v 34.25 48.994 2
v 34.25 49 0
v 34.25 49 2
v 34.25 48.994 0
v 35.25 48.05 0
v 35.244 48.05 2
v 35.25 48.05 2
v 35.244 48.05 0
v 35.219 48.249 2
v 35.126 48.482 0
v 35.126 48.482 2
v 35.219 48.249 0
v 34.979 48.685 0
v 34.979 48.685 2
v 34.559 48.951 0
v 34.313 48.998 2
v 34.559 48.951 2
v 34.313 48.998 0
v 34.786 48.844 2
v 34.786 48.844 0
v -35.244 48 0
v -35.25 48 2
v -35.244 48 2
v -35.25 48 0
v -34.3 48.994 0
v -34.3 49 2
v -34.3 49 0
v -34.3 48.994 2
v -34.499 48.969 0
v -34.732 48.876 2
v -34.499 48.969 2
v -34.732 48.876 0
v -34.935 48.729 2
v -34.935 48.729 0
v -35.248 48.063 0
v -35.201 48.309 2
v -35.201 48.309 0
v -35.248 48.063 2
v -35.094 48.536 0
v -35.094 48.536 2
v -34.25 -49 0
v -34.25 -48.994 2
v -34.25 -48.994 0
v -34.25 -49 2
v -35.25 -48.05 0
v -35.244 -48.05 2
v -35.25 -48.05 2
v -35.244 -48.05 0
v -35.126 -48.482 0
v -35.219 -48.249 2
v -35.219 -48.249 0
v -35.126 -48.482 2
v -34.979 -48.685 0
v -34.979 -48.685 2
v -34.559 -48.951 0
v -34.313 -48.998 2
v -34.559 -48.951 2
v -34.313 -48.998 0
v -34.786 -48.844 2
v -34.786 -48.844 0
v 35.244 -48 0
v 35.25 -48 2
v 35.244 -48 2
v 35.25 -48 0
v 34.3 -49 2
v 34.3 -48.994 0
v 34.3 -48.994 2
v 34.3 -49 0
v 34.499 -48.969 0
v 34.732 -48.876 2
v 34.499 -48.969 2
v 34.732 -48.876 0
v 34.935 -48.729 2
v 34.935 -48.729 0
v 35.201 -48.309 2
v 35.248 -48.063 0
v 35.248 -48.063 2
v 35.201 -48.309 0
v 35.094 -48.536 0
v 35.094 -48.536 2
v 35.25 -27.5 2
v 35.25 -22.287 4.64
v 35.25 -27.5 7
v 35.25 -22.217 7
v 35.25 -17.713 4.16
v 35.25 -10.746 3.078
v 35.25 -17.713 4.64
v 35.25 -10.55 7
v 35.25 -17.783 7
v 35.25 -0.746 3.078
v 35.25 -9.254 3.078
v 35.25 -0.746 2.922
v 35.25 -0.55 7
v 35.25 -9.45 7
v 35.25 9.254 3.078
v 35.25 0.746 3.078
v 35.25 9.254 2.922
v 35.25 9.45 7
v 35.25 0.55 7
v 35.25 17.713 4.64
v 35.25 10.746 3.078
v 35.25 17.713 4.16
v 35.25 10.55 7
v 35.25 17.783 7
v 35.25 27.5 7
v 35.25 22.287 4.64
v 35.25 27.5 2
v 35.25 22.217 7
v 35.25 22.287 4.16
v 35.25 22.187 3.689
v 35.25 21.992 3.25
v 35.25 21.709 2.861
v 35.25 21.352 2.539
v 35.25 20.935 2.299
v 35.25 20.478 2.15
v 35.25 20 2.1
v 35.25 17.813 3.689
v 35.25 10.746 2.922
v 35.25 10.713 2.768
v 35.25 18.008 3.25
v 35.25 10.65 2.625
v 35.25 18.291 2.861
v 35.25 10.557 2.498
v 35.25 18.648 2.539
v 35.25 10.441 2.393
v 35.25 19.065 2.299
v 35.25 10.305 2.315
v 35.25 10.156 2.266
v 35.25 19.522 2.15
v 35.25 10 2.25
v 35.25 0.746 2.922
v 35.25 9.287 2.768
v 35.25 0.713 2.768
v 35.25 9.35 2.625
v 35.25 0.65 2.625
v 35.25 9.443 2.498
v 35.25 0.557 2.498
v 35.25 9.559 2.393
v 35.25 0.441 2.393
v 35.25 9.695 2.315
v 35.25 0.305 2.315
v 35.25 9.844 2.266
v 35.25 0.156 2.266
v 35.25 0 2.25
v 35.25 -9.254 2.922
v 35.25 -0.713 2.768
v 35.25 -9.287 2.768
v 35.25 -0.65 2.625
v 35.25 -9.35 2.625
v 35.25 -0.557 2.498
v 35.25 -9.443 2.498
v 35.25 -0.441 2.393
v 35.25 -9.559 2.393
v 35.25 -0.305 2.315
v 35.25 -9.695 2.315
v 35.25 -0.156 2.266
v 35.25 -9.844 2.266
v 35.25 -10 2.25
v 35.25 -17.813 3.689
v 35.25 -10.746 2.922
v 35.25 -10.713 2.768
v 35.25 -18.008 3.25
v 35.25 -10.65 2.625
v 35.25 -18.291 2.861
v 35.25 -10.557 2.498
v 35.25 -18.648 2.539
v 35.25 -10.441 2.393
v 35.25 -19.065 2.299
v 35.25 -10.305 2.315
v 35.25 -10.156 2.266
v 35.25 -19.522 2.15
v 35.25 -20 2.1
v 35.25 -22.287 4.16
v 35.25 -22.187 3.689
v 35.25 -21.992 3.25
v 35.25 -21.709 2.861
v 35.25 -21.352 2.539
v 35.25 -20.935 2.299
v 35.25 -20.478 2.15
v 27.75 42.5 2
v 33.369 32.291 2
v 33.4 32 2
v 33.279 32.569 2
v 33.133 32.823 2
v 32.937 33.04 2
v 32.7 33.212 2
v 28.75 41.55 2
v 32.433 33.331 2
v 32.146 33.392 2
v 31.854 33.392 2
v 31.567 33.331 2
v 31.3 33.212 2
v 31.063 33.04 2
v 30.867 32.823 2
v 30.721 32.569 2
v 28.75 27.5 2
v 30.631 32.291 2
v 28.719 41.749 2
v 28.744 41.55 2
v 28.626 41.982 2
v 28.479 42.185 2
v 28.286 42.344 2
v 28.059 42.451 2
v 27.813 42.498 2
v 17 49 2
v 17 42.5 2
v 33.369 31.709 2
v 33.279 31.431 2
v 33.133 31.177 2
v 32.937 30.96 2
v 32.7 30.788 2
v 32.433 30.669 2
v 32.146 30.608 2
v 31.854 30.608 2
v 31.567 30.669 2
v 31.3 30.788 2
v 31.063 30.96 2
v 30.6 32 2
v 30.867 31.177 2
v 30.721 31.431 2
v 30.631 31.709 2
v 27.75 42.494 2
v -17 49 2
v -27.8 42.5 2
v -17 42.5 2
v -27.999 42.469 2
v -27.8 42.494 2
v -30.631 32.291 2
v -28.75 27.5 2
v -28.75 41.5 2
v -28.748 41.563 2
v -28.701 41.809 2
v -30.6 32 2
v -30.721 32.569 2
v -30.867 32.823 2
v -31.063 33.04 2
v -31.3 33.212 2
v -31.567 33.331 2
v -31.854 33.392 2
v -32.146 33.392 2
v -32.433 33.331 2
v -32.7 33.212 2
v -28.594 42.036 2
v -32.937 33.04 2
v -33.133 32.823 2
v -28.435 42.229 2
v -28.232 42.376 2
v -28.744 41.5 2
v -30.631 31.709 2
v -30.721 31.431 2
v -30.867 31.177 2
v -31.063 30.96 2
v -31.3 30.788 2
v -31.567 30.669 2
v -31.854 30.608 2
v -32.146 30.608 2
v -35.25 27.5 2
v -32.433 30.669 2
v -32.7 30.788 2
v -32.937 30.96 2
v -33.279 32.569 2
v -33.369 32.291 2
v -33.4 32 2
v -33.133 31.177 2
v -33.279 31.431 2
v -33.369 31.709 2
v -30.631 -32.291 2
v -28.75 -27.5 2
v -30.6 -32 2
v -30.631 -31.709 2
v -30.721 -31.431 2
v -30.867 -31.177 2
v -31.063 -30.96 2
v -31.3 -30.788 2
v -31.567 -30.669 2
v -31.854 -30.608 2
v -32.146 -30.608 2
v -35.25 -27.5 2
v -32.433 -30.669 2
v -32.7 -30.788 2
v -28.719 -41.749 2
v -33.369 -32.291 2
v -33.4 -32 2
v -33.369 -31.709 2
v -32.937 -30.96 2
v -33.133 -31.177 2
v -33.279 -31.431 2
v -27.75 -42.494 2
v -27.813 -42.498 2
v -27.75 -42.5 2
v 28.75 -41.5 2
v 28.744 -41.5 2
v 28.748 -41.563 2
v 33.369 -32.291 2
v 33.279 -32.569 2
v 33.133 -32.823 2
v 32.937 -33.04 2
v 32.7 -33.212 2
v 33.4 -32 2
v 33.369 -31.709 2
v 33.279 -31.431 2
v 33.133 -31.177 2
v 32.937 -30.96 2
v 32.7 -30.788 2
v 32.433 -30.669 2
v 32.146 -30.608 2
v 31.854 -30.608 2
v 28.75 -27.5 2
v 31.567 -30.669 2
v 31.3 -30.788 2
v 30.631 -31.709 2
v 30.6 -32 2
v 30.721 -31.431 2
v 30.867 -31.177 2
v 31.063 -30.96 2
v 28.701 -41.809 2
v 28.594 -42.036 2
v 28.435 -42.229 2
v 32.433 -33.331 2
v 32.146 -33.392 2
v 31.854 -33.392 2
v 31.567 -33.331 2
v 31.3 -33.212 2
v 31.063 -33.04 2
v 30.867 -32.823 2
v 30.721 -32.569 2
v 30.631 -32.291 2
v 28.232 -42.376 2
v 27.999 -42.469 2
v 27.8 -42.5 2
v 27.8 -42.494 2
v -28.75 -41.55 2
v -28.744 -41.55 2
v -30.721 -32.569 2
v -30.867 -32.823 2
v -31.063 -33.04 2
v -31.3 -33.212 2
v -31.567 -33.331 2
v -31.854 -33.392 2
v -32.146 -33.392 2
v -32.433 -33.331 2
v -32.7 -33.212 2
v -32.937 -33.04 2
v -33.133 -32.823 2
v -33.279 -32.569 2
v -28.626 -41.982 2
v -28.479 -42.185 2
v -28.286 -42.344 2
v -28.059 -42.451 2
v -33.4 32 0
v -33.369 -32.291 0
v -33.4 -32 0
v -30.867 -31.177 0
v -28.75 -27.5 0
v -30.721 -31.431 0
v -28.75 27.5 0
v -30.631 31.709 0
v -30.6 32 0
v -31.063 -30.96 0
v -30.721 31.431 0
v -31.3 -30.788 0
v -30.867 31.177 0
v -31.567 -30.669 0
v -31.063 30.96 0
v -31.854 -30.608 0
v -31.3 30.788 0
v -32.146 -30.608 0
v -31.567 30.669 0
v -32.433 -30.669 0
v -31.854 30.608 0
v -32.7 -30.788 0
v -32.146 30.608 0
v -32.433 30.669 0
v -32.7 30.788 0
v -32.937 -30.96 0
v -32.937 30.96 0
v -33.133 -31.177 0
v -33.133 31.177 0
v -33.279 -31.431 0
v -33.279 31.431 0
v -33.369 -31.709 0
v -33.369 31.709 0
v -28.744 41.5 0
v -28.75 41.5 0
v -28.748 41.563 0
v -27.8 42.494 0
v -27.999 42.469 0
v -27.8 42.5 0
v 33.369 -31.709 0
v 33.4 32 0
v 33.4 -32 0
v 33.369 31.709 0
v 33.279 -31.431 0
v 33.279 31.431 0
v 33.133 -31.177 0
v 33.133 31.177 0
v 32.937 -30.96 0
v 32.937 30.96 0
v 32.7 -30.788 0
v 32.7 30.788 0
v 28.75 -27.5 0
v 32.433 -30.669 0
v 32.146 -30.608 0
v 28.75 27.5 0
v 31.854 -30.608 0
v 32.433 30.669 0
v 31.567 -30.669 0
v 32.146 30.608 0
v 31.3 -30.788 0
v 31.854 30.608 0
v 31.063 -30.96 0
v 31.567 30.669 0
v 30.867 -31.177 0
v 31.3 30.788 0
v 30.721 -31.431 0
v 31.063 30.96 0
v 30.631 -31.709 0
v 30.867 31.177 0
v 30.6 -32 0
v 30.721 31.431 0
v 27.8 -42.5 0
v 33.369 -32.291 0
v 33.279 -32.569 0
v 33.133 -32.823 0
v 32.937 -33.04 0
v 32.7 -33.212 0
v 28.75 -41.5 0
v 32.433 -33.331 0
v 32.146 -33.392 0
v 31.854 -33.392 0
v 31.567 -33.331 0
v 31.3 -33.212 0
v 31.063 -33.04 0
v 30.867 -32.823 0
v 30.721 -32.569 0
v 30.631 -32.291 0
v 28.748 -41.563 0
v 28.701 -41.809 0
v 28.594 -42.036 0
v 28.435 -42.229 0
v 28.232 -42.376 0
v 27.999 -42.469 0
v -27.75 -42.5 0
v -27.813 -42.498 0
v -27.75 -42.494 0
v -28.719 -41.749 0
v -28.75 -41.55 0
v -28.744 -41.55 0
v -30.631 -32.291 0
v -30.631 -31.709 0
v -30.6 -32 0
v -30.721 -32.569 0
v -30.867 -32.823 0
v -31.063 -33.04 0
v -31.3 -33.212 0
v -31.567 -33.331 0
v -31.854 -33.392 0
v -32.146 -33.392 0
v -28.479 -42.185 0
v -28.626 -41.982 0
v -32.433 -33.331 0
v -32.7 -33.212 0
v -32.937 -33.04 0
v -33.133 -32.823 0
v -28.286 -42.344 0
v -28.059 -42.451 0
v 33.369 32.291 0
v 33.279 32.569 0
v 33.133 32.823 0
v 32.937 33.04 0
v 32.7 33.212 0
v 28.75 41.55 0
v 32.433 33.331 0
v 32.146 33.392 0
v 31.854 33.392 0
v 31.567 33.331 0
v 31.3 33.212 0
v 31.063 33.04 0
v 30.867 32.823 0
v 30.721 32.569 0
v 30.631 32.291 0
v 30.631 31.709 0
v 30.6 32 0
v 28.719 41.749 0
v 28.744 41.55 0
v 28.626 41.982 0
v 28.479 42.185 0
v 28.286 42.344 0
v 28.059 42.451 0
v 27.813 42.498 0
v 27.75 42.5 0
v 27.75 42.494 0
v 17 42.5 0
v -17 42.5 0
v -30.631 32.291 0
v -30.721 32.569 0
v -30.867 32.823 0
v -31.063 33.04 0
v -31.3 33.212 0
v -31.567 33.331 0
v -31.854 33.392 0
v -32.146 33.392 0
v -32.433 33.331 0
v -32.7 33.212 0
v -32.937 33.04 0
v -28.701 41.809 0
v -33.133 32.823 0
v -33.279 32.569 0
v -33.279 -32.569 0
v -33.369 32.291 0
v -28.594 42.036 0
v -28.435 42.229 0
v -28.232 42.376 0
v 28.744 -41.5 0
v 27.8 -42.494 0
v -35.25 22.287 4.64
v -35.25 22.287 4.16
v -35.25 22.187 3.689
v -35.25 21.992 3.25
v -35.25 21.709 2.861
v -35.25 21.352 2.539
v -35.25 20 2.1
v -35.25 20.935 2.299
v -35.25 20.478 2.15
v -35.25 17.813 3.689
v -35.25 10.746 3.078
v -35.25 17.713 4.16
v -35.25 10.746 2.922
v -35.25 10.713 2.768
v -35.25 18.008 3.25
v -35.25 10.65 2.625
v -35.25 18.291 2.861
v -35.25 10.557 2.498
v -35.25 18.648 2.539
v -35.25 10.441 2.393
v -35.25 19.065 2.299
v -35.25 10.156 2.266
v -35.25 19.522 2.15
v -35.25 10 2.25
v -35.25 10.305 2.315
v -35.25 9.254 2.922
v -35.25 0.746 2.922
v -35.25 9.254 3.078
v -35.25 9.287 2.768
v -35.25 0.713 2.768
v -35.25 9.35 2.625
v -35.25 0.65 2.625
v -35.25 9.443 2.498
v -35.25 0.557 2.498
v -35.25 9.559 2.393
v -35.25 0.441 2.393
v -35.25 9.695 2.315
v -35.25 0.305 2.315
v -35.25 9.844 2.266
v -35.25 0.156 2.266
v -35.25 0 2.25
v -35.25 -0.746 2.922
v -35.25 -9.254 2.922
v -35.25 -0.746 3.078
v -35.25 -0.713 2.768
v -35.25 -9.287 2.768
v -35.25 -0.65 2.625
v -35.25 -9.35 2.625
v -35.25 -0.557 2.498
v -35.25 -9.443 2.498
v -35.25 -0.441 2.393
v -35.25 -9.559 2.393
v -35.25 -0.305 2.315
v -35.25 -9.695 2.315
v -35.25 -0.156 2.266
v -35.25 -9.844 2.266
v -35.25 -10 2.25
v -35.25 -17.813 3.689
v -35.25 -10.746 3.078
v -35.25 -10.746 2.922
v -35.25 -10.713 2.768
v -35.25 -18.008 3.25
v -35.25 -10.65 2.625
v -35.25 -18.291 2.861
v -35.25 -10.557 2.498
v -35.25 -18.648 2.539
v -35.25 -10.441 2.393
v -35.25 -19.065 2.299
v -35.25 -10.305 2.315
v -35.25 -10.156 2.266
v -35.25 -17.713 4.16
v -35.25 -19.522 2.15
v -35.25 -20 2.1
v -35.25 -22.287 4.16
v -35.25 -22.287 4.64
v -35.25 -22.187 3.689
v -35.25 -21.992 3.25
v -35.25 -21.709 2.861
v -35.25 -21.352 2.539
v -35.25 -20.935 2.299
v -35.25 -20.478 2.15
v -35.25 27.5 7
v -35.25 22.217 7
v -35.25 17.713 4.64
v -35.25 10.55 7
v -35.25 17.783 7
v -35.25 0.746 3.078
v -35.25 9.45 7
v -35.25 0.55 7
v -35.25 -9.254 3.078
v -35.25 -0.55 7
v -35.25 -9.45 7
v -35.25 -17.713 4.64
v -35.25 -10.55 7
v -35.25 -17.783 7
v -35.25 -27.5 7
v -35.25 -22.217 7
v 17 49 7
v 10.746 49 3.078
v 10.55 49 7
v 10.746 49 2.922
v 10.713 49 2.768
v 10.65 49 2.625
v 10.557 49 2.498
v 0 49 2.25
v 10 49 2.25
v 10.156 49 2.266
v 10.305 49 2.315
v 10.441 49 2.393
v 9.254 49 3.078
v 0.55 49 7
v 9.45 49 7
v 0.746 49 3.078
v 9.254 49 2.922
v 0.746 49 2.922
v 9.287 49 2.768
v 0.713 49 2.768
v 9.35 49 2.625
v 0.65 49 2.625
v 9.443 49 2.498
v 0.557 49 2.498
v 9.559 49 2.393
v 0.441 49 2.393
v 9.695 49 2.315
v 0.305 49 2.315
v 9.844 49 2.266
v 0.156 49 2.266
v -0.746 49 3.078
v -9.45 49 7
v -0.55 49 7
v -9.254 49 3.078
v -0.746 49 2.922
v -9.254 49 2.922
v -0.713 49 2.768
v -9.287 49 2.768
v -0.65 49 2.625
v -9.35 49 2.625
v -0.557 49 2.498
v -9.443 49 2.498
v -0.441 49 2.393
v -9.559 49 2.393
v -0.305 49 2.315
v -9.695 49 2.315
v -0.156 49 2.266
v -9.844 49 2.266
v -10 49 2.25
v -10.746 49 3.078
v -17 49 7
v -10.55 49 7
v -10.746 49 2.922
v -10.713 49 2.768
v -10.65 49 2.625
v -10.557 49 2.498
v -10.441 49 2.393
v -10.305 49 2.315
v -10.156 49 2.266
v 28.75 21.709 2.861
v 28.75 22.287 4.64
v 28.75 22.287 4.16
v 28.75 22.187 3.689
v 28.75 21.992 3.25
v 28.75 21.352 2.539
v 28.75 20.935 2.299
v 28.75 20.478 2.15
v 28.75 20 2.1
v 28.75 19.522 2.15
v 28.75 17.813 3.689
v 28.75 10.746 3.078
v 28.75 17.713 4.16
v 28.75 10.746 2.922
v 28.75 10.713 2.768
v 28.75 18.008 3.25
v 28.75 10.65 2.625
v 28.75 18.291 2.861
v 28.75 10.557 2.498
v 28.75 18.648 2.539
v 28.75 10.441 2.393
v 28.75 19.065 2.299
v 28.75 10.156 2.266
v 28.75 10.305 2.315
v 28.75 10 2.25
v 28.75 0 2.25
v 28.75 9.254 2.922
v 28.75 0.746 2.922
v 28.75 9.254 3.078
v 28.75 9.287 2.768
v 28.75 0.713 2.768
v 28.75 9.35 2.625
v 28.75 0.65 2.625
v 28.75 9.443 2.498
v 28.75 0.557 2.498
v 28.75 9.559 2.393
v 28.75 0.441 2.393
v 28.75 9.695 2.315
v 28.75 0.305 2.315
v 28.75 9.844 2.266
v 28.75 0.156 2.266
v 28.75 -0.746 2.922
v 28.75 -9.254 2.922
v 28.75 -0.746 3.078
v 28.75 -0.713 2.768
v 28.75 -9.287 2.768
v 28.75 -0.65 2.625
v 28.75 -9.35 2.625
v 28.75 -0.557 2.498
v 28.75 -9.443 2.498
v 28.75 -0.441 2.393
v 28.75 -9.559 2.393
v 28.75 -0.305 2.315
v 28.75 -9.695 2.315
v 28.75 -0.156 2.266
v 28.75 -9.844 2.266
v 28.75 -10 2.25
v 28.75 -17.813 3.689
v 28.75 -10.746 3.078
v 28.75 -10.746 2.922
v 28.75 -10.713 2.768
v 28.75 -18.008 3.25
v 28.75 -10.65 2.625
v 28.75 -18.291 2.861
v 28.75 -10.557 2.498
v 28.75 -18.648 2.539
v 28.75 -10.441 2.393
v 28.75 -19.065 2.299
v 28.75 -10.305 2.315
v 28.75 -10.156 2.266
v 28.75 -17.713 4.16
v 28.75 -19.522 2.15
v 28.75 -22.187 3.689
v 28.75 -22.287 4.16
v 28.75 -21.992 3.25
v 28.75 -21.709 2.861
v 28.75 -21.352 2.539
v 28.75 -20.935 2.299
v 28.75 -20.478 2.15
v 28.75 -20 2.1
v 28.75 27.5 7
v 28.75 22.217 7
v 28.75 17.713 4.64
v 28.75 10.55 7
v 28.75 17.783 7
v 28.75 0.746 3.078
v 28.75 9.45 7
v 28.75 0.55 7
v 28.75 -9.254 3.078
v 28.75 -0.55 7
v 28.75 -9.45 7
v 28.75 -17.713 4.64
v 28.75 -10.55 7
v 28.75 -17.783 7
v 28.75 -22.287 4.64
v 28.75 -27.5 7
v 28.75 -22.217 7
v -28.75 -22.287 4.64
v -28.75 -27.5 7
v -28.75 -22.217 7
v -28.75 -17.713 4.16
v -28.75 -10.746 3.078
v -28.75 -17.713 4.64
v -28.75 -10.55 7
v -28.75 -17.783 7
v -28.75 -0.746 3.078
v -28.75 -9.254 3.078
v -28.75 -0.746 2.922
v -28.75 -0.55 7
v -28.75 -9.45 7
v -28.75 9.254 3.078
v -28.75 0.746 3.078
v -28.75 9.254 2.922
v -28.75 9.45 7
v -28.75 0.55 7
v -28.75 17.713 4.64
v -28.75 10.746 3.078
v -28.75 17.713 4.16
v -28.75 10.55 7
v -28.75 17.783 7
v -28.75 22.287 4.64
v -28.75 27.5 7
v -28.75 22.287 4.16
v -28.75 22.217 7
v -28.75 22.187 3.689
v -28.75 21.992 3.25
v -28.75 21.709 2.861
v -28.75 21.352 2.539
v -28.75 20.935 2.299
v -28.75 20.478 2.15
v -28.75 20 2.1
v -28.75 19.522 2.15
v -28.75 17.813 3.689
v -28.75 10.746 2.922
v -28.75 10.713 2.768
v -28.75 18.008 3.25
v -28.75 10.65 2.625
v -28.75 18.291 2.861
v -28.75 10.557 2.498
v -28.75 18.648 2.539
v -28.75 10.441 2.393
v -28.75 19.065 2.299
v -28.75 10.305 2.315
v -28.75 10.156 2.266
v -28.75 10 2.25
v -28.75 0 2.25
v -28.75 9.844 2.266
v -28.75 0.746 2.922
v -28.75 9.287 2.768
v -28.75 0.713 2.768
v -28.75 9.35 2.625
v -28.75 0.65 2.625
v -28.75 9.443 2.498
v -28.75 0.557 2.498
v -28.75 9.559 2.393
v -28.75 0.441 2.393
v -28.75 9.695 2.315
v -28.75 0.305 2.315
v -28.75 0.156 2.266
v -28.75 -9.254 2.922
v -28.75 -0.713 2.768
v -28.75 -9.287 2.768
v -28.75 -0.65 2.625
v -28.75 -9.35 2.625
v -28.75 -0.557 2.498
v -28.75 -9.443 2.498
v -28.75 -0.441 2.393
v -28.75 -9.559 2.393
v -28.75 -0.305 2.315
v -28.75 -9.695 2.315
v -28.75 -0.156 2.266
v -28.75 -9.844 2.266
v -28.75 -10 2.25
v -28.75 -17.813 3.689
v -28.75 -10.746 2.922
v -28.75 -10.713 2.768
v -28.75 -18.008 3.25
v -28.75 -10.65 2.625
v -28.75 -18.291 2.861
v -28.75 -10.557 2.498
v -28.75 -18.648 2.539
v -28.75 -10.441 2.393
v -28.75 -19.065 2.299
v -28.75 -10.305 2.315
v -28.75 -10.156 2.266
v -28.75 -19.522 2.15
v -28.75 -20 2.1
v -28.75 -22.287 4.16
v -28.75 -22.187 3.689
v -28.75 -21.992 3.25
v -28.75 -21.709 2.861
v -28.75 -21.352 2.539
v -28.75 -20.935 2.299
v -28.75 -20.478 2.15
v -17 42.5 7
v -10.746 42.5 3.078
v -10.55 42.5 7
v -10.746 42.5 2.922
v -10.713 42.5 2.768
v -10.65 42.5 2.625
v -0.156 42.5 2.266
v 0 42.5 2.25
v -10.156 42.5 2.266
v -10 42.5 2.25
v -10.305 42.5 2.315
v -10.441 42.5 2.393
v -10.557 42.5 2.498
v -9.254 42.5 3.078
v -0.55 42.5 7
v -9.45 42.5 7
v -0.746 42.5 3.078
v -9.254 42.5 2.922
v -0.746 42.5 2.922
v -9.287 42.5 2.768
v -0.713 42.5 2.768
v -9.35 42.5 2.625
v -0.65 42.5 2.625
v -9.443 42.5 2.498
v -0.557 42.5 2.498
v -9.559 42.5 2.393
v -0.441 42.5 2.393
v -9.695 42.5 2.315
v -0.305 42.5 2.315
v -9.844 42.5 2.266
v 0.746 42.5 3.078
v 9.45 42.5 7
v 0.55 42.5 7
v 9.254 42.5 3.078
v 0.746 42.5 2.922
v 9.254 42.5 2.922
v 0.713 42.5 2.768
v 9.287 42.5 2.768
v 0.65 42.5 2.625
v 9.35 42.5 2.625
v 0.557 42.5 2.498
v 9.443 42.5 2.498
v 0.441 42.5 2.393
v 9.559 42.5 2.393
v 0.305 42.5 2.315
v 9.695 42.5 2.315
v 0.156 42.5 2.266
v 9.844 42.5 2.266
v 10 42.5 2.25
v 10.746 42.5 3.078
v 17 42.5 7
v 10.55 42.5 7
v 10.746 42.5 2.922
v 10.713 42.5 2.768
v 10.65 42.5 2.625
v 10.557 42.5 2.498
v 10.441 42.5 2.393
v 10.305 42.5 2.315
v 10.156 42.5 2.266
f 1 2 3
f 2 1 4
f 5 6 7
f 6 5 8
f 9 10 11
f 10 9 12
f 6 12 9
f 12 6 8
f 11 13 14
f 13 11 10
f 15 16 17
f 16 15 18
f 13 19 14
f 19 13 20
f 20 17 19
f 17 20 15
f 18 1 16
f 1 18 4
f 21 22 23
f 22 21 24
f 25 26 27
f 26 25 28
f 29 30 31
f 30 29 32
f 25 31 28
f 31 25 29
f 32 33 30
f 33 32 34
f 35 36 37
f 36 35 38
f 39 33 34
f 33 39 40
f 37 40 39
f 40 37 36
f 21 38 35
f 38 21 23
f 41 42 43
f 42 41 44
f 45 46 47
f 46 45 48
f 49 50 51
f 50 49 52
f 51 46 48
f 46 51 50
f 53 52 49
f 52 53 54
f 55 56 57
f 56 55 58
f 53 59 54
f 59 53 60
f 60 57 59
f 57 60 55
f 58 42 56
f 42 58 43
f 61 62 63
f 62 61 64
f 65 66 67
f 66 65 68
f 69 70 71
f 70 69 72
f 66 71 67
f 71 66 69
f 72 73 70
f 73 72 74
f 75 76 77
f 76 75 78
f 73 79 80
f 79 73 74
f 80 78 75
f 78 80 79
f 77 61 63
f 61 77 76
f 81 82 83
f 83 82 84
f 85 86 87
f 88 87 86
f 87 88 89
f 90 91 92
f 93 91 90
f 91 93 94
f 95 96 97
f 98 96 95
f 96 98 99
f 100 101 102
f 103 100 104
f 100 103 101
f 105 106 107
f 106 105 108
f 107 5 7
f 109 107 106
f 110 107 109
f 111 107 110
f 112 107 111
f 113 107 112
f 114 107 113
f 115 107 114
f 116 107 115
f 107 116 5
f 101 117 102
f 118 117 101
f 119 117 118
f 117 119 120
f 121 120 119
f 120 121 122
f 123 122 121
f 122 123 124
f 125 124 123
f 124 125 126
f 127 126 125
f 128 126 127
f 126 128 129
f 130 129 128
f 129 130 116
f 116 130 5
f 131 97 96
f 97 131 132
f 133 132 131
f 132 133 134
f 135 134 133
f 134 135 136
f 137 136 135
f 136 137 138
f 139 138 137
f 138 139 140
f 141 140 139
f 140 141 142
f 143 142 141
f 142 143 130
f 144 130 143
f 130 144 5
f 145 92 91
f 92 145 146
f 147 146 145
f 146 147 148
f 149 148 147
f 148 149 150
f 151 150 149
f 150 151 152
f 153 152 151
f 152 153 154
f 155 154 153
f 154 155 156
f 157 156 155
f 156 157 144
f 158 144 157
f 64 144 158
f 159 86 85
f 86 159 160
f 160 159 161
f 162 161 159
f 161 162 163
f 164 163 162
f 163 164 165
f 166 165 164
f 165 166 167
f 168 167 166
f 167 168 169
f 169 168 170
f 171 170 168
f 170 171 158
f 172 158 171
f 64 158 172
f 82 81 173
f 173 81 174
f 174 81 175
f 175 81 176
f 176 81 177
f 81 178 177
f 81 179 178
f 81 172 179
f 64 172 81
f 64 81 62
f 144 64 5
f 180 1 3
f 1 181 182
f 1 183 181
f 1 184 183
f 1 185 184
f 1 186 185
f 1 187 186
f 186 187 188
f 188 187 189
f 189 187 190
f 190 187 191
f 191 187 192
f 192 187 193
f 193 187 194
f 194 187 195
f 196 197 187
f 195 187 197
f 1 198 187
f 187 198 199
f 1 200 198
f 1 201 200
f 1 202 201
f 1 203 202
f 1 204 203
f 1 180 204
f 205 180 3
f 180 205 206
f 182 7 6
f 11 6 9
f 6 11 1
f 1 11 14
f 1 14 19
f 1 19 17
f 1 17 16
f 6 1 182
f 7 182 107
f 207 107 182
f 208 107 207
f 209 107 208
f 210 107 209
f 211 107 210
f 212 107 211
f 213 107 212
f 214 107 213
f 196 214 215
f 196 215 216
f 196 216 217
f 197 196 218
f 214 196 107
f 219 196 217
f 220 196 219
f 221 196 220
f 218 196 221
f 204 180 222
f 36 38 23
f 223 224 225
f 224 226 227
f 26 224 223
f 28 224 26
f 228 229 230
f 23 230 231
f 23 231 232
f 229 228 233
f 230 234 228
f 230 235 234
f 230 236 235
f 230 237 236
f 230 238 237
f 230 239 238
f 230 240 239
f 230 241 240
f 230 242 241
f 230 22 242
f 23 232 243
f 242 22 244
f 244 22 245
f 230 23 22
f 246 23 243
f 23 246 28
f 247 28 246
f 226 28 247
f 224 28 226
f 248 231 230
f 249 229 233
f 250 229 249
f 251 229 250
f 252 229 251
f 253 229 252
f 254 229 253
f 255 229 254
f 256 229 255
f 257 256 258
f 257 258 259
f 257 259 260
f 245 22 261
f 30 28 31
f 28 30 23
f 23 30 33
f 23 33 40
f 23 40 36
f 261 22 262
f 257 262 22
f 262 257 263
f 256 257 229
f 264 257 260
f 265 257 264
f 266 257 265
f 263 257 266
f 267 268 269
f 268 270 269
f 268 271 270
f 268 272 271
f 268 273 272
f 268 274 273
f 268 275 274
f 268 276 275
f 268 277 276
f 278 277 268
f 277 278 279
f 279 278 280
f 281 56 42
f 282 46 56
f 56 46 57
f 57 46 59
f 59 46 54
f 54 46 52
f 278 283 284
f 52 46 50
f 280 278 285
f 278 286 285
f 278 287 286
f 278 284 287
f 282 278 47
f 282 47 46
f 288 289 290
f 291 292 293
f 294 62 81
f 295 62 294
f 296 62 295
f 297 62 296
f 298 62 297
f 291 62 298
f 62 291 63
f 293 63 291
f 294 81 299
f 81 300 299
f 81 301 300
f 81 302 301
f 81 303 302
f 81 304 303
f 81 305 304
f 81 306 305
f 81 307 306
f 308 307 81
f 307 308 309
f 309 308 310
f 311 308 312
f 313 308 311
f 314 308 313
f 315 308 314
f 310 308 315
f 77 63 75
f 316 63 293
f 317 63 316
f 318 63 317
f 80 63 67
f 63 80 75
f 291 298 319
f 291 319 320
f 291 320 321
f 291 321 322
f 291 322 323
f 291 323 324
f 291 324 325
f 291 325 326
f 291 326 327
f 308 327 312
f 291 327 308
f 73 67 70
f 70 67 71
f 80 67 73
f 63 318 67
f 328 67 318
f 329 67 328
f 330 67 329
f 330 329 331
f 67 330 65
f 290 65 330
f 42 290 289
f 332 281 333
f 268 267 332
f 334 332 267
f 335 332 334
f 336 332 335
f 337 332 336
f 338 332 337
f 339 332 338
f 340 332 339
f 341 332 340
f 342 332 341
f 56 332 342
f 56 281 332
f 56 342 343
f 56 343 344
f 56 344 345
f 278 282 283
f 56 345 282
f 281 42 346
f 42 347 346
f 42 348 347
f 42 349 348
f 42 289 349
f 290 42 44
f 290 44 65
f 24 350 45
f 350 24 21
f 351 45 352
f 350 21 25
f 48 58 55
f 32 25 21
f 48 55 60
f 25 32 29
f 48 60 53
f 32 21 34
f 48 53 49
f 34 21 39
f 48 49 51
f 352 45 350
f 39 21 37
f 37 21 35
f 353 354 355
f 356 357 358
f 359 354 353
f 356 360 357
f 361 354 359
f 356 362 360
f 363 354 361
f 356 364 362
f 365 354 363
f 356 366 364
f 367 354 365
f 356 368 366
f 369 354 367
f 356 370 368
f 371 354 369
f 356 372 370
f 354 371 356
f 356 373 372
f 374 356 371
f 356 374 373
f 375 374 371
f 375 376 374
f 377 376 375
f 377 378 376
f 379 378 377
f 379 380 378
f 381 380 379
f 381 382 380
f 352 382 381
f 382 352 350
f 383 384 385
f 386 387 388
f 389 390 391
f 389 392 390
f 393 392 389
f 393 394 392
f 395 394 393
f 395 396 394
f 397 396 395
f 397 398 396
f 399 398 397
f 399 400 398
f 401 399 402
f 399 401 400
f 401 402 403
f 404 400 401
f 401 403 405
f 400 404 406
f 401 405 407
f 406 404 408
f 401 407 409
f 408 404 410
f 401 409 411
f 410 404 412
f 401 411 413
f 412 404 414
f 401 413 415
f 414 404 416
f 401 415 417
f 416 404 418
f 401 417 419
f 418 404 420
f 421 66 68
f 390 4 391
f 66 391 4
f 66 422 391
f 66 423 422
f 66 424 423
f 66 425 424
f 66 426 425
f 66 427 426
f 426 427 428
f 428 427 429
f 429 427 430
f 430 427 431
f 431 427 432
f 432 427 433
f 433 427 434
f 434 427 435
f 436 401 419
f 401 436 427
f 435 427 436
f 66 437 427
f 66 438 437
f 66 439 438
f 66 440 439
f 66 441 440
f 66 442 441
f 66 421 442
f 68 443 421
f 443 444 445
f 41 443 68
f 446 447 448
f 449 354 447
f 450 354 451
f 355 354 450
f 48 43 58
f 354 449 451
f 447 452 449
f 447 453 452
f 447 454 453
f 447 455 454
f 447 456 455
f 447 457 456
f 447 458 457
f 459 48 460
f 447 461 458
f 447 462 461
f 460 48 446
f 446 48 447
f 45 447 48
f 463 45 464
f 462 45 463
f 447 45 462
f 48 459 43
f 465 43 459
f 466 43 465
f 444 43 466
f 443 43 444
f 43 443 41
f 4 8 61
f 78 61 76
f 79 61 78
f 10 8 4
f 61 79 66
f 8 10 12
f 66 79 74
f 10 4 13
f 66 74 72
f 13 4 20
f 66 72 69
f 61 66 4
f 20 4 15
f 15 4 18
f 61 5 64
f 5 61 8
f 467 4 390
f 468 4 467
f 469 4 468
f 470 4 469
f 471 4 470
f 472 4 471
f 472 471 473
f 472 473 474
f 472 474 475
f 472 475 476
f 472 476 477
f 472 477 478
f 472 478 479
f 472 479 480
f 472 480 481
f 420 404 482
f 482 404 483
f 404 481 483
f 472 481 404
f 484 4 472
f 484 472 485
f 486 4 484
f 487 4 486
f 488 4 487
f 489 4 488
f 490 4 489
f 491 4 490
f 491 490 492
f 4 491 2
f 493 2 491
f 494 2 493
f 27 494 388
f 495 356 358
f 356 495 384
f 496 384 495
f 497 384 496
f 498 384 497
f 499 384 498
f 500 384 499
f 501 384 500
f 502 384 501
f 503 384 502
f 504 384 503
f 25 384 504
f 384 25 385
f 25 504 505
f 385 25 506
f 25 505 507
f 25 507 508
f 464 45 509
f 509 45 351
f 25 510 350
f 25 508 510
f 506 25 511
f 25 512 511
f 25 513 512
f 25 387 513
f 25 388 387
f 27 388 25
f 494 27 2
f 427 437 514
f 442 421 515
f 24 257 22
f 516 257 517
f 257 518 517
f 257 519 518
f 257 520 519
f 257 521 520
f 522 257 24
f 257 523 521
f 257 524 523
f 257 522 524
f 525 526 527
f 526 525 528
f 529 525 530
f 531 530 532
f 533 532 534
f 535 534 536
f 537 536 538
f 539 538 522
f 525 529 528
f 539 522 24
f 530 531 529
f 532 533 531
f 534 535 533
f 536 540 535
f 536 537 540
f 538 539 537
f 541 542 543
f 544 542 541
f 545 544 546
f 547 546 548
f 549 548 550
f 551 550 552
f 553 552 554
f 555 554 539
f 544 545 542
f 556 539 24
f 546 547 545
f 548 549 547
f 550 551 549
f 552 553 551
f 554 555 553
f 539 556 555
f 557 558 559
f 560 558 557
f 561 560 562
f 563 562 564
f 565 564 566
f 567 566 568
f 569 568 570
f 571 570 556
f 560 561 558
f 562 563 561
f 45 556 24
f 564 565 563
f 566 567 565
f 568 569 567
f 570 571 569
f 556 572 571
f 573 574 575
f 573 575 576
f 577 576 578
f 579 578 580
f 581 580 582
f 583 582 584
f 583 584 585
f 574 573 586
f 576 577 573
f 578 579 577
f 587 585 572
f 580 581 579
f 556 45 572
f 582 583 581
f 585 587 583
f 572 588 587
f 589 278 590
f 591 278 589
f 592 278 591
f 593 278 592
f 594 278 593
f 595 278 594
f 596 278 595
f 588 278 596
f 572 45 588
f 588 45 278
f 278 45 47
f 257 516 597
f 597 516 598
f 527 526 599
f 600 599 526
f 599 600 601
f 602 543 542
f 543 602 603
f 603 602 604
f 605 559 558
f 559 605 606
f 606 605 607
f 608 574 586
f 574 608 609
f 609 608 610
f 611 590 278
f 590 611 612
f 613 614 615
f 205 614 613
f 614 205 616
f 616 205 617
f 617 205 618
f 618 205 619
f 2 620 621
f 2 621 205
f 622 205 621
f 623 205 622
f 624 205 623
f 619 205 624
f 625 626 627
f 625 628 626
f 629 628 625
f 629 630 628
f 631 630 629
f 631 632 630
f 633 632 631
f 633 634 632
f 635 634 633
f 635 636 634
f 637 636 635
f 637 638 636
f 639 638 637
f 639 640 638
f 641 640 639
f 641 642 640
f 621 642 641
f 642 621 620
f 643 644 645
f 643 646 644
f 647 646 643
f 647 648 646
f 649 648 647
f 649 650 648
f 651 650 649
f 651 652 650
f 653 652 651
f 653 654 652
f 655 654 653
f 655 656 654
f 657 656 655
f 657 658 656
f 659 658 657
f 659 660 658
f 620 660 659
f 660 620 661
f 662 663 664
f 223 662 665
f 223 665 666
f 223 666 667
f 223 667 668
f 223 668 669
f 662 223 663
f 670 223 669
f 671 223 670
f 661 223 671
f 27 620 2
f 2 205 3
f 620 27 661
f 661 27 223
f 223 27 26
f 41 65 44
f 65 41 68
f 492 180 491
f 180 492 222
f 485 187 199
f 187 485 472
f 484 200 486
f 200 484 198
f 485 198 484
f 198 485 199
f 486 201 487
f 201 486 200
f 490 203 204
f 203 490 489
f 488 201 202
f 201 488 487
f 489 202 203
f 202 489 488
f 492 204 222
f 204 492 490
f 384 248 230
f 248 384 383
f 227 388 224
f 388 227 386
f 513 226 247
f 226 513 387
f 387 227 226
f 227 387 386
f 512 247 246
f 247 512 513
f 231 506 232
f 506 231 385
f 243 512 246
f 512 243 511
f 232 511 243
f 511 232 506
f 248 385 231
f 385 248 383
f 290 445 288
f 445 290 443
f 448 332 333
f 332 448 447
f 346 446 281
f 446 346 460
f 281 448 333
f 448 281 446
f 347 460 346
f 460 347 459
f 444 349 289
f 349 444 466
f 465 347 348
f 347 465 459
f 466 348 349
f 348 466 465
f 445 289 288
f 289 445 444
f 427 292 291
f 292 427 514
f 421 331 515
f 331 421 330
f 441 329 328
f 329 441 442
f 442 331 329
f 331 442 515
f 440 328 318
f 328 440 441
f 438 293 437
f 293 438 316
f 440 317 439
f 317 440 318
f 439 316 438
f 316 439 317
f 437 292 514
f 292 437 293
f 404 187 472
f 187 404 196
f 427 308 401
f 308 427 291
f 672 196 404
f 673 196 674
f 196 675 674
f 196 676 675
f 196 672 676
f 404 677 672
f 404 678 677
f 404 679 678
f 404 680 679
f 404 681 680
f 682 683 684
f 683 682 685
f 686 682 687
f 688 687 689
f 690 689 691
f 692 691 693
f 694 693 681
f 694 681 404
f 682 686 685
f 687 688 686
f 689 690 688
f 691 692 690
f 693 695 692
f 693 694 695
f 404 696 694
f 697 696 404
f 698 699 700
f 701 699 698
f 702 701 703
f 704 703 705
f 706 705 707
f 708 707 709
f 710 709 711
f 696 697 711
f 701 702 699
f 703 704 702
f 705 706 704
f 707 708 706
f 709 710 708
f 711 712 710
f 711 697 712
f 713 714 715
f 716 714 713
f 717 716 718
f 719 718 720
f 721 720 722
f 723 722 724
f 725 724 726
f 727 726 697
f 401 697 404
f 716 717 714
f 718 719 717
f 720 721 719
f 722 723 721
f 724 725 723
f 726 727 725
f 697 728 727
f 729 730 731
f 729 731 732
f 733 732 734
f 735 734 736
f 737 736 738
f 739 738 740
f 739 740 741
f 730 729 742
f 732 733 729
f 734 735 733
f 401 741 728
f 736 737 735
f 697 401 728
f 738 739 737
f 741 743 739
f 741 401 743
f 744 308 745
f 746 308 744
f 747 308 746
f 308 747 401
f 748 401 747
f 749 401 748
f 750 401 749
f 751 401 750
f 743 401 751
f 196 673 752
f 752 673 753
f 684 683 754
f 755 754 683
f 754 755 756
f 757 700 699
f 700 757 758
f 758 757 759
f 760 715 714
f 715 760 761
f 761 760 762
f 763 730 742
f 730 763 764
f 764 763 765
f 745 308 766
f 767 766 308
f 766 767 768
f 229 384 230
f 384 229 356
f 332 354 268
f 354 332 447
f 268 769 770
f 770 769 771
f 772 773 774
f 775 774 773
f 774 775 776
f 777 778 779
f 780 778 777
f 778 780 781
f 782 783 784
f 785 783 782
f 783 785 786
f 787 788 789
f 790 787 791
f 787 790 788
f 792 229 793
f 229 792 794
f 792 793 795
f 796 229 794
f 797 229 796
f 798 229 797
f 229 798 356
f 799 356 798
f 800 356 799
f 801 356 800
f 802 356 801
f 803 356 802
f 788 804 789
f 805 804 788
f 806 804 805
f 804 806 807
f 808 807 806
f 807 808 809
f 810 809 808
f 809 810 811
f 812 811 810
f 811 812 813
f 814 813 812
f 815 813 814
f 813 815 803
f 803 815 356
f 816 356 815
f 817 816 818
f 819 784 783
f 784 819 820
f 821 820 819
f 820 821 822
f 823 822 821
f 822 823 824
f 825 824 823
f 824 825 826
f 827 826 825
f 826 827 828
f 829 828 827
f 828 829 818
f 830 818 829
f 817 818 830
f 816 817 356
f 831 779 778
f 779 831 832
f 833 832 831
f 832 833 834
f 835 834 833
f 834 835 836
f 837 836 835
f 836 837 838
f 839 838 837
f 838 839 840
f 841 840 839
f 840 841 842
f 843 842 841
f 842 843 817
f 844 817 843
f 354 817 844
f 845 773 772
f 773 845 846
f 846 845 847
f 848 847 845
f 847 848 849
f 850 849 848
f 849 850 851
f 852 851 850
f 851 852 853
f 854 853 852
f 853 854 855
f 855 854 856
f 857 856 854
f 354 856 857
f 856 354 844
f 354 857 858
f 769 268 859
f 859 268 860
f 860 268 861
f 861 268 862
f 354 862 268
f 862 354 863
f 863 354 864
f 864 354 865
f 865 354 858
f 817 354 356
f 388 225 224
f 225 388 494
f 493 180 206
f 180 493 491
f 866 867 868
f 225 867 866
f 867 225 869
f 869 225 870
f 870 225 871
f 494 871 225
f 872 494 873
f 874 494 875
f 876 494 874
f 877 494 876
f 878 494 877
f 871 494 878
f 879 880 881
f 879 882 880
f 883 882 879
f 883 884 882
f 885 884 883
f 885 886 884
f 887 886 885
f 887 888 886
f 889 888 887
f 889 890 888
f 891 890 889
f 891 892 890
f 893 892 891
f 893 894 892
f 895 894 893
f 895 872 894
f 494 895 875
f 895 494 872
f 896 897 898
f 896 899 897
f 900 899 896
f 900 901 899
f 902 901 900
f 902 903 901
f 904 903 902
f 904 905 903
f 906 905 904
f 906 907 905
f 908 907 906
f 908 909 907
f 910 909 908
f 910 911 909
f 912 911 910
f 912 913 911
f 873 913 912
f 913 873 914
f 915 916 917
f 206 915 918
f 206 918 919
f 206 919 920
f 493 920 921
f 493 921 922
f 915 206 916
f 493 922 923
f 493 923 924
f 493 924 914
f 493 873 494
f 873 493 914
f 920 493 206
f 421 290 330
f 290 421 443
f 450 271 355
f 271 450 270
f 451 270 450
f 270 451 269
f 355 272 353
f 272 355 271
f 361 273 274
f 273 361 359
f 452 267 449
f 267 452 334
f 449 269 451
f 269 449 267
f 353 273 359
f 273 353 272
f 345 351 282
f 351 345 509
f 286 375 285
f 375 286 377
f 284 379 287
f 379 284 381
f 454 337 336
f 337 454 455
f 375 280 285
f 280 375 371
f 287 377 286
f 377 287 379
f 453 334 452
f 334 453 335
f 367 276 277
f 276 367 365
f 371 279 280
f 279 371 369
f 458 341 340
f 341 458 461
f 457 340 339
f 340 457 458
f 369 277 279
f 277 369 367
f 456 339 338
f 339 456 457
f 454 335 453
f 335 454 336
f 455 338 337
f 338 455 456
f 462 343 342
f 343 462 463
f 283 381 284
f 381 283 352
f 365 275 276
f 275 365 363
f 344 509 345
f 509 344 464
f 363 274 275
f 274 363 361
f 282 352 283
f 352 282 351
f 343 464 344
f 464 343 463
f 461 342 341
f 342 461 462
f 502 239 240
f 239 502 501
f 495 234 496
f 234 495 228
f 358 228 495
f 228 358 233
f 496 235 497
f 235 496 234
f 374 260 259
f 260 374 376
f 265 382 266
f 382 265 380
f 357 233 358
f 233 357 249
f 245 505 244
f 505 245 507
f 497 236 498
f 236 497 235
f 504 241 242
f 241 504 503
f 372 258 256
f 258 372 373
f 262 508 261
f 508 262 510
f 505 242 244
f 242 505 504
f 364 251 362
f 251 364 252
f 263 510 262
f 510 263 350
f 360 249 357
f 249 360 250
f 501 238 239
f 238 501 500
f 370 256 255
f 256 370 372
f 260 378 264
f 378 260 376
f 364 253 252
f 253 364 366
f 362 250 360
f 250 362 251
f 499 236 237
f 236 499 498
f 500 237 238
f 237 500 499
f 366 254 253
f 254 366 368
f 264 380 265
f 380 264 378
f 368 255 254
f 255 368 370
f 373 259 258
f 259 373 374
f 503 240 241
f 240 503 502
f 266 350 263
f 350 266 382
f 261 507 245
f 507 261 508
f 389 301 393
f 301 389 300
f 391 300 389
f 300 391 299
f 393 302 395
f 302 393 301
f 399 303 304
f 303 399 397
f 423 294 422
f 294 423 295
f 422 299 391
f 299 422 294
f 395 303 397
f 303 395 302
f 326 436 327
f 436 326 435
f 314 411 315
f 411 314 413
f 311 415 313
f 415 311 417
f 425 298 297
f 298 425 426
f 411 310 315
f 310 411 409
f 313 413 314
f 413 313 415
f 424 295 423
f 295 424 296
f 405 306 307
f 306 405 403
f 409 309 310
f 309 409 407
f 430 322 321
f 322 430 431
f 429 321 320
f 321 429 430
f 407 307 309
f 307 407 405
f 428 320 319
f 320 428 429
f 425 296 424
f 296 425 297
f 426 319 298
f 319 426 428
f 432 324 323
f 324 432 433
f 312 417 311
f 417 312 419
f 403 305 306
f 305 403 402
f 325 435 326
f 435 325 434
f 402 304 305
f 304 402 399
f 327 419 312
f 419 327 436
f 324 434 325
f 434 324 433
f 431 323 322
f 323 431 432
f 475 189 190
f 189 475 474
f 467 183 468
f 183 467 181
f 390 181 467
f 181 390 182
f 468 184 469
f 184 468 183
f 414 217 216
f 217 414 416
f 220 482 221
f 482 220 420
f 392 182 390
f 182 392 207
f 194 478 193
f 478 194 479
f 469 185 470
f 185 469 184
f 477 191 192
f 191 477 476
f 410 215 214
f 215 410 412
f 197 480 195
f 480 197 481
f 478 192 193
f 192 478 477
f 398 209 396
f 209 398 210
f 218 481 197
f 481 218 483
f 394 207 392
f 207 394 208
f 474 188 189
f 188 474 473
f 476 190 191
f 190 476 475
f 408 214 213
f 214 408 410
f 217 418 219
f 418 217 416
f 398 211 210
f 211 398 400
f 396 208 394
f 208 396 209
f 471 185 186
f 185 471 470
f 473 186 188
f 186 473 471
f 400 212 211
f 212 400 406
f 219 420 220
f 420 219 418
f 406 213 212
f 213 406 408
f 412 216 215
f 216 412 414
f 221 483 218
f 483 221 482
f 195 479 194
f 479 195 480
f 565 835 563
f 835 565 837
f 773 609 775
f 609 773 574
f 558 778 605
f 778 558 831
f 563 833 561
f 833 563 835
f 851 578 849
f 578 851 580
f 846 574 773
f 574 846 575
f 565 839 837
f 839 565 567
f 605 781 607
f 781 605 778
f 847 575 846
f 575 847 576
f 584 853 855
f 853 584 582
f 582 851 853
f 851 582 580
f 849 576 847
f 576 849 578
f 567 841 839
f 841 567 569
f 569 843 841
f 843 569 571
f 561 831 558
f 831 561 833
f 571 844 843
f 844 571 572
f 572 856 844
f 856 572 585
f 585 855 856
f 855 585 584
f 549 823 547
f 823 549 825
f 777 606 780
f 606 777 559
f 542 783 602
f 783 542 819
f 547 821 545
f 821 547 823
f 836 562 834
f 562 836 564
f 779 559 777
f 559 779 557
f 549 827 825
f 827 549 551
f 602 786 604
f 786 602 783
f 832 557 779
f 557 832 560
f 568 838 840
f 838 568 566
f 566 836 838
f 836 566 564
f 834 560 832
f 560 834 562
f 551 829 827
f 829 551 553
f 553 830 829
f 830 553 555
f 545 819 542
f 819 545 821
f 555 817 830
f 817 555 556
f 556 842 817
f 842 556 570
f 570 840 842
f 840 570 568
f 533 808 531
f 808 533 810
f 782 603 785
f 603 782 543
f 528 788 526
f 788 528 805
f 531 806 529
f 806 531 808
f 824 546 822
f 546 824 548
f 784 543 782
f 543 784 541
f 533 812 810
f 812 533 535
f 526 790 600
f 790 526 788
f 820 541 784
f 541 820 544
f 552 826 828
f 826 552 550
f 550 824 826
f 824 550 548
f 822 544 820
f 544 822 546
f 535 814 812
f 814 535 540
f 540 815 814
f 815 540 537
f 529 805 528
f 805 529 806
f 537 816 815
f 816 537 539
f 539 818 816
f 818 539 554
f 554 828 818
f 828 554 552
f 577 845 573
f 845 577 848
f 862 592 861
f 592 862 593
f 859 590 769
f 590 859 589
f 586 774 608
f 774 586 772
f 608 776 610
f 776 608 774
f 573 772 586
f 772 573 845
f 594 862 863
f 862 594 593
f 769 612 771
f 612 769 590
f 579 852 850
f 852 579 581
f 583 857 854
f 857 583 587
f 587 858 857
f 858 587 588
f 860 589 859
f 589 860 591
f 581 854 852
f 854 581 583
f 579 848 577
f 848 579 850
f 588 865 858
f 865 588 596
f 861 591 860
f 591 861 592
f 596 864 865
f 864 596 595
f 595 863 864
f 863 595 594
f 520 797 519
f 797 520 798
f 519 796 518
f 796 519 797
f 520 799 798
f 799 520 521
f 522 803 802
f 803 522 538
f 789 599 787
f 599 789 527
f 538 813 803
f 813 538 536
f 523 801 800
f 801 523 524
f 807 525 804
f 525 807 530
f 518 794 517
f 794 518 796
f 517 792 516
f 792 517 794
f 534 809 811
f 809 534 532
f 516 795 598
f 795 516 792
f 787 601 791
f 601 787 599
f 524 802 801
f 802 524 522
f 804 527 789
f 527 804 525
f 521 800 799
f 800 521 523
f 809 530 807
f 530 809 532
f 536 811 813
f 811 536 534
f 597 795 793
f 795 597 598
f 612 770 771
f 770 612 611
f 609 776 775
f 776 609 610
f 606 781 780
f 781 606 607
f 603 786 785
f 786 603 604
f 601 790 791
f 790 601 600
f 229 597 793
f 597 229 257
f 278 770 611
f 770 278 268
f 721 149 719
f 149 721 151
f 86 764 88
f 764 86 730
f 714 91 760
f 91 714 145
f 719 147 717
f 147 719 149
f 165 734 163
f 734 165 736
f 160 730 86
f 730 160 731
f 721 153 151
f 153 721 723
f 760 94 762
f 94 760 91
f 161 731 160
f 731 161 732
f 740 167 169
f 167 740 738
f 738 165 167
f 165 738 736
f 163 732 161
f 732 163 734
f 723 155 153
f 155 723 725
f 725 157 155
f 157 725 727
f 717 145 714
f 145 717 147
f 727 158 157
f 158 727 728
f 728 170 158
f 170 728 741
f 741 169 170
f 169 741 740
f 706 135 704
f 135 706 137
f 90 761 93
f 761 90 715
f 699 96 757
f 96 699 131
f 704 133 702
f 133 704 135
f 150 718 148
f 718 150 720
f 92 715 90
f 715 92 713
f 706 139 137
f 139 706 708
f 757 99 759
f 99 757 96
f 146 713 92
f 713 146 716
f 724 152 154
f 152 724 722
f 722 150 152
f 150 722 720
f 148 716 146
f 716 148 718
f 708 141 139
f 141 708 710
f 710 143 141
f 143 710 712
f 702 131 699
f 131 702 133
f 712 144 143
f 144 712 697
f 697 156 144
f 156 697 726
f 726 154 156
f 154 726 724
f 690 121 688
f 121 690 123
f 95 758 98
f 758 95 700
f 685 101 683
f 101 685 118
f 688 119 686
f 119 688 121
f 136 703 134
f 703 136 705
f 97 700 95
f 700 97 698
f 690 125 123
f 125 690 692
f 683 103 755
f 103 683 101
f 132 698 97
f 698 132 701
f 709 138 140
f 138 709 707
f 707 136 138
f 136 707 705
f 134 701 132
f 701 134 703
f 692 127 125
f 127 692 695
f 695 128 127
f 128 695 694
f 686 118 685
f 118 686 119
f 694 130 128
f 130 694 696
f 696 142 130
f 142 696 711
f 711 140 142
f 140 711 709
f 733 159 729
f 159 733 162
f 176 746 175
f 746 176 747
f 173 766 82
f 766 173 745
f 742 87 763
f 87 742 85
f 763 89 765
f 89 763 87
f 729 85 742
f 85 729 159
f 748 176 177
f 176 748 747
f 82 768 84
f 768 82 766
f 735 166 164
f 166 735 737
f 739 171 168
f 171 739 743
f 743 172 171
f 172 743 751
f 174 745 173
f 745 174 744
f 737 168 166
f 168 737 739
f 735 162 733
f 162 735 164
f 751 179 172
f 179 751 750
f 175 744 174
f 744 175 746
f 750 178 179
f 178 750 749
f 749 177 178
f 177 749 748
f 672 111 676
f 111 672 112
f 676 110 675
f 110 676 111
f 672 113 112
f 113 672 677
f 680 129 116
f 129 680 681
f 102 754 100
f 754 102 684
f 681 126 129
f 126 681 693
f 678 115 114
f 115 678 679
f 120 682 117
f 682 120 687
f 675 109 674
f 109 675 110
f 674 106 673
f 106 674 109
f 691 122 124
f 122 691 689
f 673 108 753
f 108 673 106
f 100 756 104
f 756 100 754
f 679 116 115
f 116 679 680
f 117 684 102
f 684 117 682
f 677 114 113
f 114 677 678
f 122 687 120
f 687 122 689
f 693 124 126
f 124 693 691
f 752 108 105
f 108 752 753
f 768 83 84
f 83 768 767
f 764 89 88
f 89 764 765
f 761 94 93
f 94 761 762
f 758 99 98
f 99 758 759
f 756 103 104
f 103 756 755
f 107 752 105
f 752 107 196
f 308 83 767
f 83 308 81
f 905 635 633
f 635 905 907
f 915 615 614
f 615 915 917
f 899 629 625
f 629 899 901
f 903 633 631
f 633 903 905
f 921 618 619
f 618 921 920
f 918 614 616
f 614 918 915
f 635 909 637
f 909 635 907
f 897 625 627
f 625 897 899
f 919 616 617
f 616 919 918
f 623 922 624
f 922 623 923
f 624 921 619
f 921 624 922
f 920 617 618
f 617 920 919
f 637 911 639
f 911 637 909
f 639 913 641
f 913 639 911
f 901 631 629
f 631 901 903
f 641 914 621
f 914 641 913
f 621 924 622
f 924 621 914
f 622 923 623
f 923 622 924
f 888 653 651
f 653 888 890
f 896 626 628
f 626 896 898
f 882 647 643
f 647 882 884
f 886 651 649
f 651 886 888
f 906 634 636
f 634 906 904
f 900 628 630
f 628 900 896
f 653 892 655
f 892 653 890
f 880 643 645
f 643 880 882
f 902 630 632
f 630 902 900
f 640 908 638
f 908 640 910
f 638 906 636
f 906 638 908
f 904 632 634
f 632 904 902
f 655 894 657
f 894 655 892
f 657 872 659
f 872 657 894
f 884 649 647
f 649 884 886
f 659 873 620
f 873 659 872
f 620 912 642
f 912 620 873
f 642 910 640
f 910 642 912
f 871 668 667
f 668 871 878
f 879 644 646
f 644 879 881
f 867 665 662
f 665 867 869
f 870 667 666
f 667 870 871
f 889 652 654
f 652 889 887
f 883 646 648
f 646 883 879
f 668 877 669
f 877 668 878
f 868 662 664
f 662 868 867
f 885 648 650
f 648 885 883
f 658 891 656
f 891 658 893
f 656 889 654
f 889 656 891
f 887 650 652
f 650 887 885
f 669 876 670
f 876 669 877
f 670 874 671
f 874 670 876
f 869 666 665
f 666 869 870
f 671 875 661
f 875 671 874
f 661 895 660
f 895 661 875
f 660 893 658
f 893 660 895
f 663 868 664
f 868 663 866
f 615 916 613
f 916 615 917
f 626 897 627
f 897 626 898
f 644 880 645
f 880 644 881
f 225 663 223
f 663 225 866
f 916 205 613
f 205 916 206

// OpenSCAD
// file: library/nutsnbolts/data-access.scad
// Norm Nuts and Bolts - a OpenSCAD library
// Copyright (C) 2012  Johannes Kneer

// This program is free software: you can redistribute it and/or modify
// it under the terms of the GNU General Public License as published by
// the Free Software Foundation, either version 3 of the License, or
// (at your option) any later version.

// This program is distributed in the hope that it will be useful,
// but WITHOUT ANY WARRANTY; without even the implied warranty of
// MERCHANTABILITY or FITNESS FOR A PARTICULAR PURPOSE.  See the
// GNU General Public License for more details.

// You should have received a copy of the GNU General Public License
// along with this program.  If not, see <http://www.gnu.org/licenses/>.


// DATABASE ACCESS FUNCTIONS AND CONSTANTS



// == CONSTANTS ==

// screw table access keys
_NB_S_DESC            = 0;
_NB_S_FAMKEY			    = 1;
_NB_S_LENGTH          = 2;
_NB_S_NOTHREAD_LENGTH = 3;

_NB_F_DESC			      = 0;
_NB_F_OUTER_DIA       = 1;
_NB_F_INNER_DIA       = 2;
_NB_F_LEAD            = 3;
_NB_F_KEY             = 4;
_NB_F_KEY_DEPTH       = 5;
_NB_F_HEAD_HEIGHT     = 6;
_NB_F_HEAD_DIA        = 7;
_NB_F_NUT_KEY         = 8;
_NB_F_NUT_HEIGHT      = 9;
_NB_F_PITCH_FINE      = 10;
_NB_F_PITCH_MEDIUM    = 11;
_NB_F_PITCH_COARSE    = 12;


// == FUNCTIONS ==

// _get_screw("descriptor")   with descriptor = M8x25
//   find the line for a general object in the data matrix

function _get_screw(n) = data_screw[search([n], data_screw)[0]];
function _get_screw_fam(n) = data_screw_fam[search([_get_screw(n)[_NB_S_FAMKEY]], data_screw_fam)[0]];

function _get_fam(n) = data_screw_fam[search([n], data_screw_fam)[0]];


// _get_XXXXX("descriptor") functions
// find a single property in the database

function _get_desc(n)        = _get_screw(n)[_NB_S_DESC];
function _get_famkey(n)         = _get_screw(n)[_NB_S_FAMKEY];
function _get_length(n)      = _get_screw(n)[_NB_S_LENGTH];
function _get_nt_length(n)   = _get_screw(n)[_NB_S_NOTHREAD_LENGTH];

function _get_outer_dia(n)   = _get_screw_fam(n)[_NB_F_OUTER_DIA];
function _get_inner_dia(n)   = _get_screw_fam(n)[_NB_F_INNER_DIA];
function _get_lead(n)        = _get_screw_fam(n)[_NB_F_LEAD];
function _get_head_height(n) = _get_screw_fam(n)[_NB_F_HEAD_HEIGHT];
function _get_head_dia(n)    = _get_screw_fam(n)[_NB_F_HEAD_DIA];
function _get_nut_key(n)     = _get_screw_fam(n)[_NB_F_NUT_KEY];
function _get_nut_height(n)  = _get_screw_fam(n)[_NB_F_NUT_HEIGHT];
function _get_fine_pitch(n)  = _get_screw_fam(n)[_NB_F_PITCH_FINE];
function _get_medium_pitch(n)  = _get_screw_fam(n)[_NB_F_PITCH_MEDIUM];
function _get_coarse_pitch(n)  = _get_screw_fam(n)[_NB_F_PITCH_COARSE];
// file: library/round-corners-cube.scad
/*
http://codeviewer.org/view/code:1b36 
Copyright (C) 2011 Sergio Vilches
This program is free software: you can redistribute it and/or modify it under the terms of the GNU General Public License as published by the Free Software Foundation, either version 3 of the License, or (at your option) any later version.
This program is distributed in the hope that it will be useful, but WITHOUT ANY WARRANTY; without even the implied warranty of MERCHANTABILITY or FITNESS FOR A PARTICULAR PURPOSE. See the GNU General Public License for more details. You should have received a copy of the GNU General Public License along with this program. If not, see <http://www.gnu.org/licenses/>.
Contact: s.vilches.e@gmail.com


    ----------------------------------------------------------- 
                 Round Corners Cube (Extruded)                
      round_corners_cube(x,y,z,r) Where:                        
         - x = Xdir width                                     
         - y = Ydir width                                     
         - z = Height of the cube                             
         - r = Rounding radious                               
                                                              
      Example: roundCornerCube(10,10,2,1);                    
     *Some times it's needed to use F6 to see good results!   
 	 ----------------------------------------------------------- 
*/
// Test it!
// round_corners_cube(10,5,2,1);


module createMeniscus(h,radius) // This module creates the shape that needs to be substracted from a cube to make its corners rounded.
difference(){        //This shape is basicly the difference between a quarter of cylinder and a cube
   translate([radius/2+0.1,radius/2+0.1,0]){
      cube([radius+0.2,radius+0.1,h+0.2],center=true);         // All that 0.x numbers are to avoid "ghost boundaries" when substracting
   }

   cylinder(h=h+0.2,r=radius,$fn = 25,center=true);
}


module round_corners_cube(x,y,z,r)  // Now we just substract the shape we have created in the four corners
difference(){
   cube([x,y,z], center=true);

translate([x/2-r,y/2-r]){  // We move to the first corner (x,y)
      rotate(0){  
         createMeniscus(z,r); // And substract the meniscus
      }
   }
   translate([-x/2+r,y/2-r]){ // To the second corner (-x,y)
      rotate(90){
         createMeniscus(z,r); // But this time we have to rotate the meniscus 90 deg
      }
   }
      translate([-x/2+r,-y/2+r]){ // ... 
      rotate(180){
         createMeniscus(z,r);
      }
   }
      translate([x/2-r,-y/2+r]){
      rotate(270){
         createMeniscus(z,r);
      }
   }
}
// file: library/params.scad
//function isfull_view(n) = n==full_view;

bottom_plate_color = [0.3, 0.7, 0.7];
top_plate_color = [0.8, 0.8, 0.3];
damper_color = [0.8, 0.2, 0.3];
gps_bracket_color = [0.3, 0.8, 0.3, 1];
option_bracket_color = [0.8, 0.8, 0.3];
pillar_color = [0.8, 0.5, 0.3];
cut_color = [0.9, 0, 0];

cc3d_hole_width = 30.5;
cut_view=false;
debug=false;
//viewModule = isfull_view(viewType);
cut_view_debug=0;

M25_outer_dia=2.8; 
M25_inner_dia=2.05; 
M25_head_dia=5;
M3_outer_dia=3.5; 
M3_inner_dia=2.8;
M3_head_dia=5.4+0.5;
// SMA Thread
M6_outer_dia=6.8;



plate_tin = 2.2;

pillar_heigth = 27;

pillar_hole_width = 64;
pillar_hole_length = 64;

option_hole_length = cc3d_hole_width;
option_hole_width = cc3d_hole_width;



DAMPER_EARS_DRAW_TOP=[0,1];
DAMPER_EARS_DRAW_BOTTOM=[0,0];
DAMPER_EARS_SHOW_DAMPER=[1,1];
DAMPER_EARS_CUT_BOTTOM=[2,0];
DAMPER_EARS_CUT_TOP=[2,1];
// main file
// tarot 680 pro - a OpenSCAD 
// Copyright (C) 2015  Gerard Valade

// This program is free software: you can redistribute it and/or modify
// it under the terms of the GNU General Public License as published by
// the Free Software Foundation, either version 3 of the License, or
// (at your option) any later version.

// This program is distributed in the hope that it will be useful,
// but WITHOUT ANY WARRANTY; without even the implied warranty of
// MERCHANTABILITY or FITNESS FOR A PARTICULAR PURPOSE.  See the
// GNU General Public License for more details.

// You should have received a copy of the GNU General Public License
// along with this program.  If not, see <http://www.gnu.org/licenses/>.


include <library/params.scad>
use <library/modules-utils.scad>
use <library/round-corners-cube.scad>

module cable_holder($fn=30)
{
	length=85;
	width=13;
	
	module holder(w=55)
	{
		difference() {
			union() {
				color (gps_bracket_color) translate([0, 0, 3.5]) cube([6.5, w, 7], center =true);
			}
			for (y = [-60:10:60]) {
				 translate([-10, y, 3]) rotate([0,90,0]) hull()
				 {
	 			 	translate([0, 0, 0]) cylinder(d=1.5, h=20);
				 	translate([-10, 0, 0]) cylinder(d=0.5, h=20);
				 } 
			}
			for (y = [-20, 20]) {
				 translate([-10, y, 4.4]) rotate([0,90,0]) hull()
				 {
	 			 	translate([0, 0, 0]) cylinder(d=4.6, h=20);
				 	translate([-10, 0, 0]) cylinder(d=4, h=20);
				 } 
			}
		}
	}
	
	module base()
	{
		difference() {
			union() {
				color (gps_bracket_color) translate([0, 0, 1]) round_corners_cube(pillar_hole_width+width/2, length+width, 2, 1);
			}
			translate([0, 0, 0]) round_corners_cube(pillar_hole_width-width/2, length, 10, 1);
			for (x = [-1, 1]) {
				for (y = [-1,1]) { 
					// pillar
					translate([x*(pillar_hole_length/2), y*(pillar_hole_width/2), 0]) {
							// pillar's hole
						translate([0, 0, -0.1])	cylinder(d=M25_outer_dia, h=14, center=false);
					}
				}
			}
		}
		
	}
	
	base();
	for (x = [-1, 1]) {
		translate([x*pillar_hole_width/2, 0, 0]) holder();
	}
	translate([0, (length+width/2)/2, 0]) rotate([0, 0, 90]) holder(w=34);
}
	
	
cable_holder();	
